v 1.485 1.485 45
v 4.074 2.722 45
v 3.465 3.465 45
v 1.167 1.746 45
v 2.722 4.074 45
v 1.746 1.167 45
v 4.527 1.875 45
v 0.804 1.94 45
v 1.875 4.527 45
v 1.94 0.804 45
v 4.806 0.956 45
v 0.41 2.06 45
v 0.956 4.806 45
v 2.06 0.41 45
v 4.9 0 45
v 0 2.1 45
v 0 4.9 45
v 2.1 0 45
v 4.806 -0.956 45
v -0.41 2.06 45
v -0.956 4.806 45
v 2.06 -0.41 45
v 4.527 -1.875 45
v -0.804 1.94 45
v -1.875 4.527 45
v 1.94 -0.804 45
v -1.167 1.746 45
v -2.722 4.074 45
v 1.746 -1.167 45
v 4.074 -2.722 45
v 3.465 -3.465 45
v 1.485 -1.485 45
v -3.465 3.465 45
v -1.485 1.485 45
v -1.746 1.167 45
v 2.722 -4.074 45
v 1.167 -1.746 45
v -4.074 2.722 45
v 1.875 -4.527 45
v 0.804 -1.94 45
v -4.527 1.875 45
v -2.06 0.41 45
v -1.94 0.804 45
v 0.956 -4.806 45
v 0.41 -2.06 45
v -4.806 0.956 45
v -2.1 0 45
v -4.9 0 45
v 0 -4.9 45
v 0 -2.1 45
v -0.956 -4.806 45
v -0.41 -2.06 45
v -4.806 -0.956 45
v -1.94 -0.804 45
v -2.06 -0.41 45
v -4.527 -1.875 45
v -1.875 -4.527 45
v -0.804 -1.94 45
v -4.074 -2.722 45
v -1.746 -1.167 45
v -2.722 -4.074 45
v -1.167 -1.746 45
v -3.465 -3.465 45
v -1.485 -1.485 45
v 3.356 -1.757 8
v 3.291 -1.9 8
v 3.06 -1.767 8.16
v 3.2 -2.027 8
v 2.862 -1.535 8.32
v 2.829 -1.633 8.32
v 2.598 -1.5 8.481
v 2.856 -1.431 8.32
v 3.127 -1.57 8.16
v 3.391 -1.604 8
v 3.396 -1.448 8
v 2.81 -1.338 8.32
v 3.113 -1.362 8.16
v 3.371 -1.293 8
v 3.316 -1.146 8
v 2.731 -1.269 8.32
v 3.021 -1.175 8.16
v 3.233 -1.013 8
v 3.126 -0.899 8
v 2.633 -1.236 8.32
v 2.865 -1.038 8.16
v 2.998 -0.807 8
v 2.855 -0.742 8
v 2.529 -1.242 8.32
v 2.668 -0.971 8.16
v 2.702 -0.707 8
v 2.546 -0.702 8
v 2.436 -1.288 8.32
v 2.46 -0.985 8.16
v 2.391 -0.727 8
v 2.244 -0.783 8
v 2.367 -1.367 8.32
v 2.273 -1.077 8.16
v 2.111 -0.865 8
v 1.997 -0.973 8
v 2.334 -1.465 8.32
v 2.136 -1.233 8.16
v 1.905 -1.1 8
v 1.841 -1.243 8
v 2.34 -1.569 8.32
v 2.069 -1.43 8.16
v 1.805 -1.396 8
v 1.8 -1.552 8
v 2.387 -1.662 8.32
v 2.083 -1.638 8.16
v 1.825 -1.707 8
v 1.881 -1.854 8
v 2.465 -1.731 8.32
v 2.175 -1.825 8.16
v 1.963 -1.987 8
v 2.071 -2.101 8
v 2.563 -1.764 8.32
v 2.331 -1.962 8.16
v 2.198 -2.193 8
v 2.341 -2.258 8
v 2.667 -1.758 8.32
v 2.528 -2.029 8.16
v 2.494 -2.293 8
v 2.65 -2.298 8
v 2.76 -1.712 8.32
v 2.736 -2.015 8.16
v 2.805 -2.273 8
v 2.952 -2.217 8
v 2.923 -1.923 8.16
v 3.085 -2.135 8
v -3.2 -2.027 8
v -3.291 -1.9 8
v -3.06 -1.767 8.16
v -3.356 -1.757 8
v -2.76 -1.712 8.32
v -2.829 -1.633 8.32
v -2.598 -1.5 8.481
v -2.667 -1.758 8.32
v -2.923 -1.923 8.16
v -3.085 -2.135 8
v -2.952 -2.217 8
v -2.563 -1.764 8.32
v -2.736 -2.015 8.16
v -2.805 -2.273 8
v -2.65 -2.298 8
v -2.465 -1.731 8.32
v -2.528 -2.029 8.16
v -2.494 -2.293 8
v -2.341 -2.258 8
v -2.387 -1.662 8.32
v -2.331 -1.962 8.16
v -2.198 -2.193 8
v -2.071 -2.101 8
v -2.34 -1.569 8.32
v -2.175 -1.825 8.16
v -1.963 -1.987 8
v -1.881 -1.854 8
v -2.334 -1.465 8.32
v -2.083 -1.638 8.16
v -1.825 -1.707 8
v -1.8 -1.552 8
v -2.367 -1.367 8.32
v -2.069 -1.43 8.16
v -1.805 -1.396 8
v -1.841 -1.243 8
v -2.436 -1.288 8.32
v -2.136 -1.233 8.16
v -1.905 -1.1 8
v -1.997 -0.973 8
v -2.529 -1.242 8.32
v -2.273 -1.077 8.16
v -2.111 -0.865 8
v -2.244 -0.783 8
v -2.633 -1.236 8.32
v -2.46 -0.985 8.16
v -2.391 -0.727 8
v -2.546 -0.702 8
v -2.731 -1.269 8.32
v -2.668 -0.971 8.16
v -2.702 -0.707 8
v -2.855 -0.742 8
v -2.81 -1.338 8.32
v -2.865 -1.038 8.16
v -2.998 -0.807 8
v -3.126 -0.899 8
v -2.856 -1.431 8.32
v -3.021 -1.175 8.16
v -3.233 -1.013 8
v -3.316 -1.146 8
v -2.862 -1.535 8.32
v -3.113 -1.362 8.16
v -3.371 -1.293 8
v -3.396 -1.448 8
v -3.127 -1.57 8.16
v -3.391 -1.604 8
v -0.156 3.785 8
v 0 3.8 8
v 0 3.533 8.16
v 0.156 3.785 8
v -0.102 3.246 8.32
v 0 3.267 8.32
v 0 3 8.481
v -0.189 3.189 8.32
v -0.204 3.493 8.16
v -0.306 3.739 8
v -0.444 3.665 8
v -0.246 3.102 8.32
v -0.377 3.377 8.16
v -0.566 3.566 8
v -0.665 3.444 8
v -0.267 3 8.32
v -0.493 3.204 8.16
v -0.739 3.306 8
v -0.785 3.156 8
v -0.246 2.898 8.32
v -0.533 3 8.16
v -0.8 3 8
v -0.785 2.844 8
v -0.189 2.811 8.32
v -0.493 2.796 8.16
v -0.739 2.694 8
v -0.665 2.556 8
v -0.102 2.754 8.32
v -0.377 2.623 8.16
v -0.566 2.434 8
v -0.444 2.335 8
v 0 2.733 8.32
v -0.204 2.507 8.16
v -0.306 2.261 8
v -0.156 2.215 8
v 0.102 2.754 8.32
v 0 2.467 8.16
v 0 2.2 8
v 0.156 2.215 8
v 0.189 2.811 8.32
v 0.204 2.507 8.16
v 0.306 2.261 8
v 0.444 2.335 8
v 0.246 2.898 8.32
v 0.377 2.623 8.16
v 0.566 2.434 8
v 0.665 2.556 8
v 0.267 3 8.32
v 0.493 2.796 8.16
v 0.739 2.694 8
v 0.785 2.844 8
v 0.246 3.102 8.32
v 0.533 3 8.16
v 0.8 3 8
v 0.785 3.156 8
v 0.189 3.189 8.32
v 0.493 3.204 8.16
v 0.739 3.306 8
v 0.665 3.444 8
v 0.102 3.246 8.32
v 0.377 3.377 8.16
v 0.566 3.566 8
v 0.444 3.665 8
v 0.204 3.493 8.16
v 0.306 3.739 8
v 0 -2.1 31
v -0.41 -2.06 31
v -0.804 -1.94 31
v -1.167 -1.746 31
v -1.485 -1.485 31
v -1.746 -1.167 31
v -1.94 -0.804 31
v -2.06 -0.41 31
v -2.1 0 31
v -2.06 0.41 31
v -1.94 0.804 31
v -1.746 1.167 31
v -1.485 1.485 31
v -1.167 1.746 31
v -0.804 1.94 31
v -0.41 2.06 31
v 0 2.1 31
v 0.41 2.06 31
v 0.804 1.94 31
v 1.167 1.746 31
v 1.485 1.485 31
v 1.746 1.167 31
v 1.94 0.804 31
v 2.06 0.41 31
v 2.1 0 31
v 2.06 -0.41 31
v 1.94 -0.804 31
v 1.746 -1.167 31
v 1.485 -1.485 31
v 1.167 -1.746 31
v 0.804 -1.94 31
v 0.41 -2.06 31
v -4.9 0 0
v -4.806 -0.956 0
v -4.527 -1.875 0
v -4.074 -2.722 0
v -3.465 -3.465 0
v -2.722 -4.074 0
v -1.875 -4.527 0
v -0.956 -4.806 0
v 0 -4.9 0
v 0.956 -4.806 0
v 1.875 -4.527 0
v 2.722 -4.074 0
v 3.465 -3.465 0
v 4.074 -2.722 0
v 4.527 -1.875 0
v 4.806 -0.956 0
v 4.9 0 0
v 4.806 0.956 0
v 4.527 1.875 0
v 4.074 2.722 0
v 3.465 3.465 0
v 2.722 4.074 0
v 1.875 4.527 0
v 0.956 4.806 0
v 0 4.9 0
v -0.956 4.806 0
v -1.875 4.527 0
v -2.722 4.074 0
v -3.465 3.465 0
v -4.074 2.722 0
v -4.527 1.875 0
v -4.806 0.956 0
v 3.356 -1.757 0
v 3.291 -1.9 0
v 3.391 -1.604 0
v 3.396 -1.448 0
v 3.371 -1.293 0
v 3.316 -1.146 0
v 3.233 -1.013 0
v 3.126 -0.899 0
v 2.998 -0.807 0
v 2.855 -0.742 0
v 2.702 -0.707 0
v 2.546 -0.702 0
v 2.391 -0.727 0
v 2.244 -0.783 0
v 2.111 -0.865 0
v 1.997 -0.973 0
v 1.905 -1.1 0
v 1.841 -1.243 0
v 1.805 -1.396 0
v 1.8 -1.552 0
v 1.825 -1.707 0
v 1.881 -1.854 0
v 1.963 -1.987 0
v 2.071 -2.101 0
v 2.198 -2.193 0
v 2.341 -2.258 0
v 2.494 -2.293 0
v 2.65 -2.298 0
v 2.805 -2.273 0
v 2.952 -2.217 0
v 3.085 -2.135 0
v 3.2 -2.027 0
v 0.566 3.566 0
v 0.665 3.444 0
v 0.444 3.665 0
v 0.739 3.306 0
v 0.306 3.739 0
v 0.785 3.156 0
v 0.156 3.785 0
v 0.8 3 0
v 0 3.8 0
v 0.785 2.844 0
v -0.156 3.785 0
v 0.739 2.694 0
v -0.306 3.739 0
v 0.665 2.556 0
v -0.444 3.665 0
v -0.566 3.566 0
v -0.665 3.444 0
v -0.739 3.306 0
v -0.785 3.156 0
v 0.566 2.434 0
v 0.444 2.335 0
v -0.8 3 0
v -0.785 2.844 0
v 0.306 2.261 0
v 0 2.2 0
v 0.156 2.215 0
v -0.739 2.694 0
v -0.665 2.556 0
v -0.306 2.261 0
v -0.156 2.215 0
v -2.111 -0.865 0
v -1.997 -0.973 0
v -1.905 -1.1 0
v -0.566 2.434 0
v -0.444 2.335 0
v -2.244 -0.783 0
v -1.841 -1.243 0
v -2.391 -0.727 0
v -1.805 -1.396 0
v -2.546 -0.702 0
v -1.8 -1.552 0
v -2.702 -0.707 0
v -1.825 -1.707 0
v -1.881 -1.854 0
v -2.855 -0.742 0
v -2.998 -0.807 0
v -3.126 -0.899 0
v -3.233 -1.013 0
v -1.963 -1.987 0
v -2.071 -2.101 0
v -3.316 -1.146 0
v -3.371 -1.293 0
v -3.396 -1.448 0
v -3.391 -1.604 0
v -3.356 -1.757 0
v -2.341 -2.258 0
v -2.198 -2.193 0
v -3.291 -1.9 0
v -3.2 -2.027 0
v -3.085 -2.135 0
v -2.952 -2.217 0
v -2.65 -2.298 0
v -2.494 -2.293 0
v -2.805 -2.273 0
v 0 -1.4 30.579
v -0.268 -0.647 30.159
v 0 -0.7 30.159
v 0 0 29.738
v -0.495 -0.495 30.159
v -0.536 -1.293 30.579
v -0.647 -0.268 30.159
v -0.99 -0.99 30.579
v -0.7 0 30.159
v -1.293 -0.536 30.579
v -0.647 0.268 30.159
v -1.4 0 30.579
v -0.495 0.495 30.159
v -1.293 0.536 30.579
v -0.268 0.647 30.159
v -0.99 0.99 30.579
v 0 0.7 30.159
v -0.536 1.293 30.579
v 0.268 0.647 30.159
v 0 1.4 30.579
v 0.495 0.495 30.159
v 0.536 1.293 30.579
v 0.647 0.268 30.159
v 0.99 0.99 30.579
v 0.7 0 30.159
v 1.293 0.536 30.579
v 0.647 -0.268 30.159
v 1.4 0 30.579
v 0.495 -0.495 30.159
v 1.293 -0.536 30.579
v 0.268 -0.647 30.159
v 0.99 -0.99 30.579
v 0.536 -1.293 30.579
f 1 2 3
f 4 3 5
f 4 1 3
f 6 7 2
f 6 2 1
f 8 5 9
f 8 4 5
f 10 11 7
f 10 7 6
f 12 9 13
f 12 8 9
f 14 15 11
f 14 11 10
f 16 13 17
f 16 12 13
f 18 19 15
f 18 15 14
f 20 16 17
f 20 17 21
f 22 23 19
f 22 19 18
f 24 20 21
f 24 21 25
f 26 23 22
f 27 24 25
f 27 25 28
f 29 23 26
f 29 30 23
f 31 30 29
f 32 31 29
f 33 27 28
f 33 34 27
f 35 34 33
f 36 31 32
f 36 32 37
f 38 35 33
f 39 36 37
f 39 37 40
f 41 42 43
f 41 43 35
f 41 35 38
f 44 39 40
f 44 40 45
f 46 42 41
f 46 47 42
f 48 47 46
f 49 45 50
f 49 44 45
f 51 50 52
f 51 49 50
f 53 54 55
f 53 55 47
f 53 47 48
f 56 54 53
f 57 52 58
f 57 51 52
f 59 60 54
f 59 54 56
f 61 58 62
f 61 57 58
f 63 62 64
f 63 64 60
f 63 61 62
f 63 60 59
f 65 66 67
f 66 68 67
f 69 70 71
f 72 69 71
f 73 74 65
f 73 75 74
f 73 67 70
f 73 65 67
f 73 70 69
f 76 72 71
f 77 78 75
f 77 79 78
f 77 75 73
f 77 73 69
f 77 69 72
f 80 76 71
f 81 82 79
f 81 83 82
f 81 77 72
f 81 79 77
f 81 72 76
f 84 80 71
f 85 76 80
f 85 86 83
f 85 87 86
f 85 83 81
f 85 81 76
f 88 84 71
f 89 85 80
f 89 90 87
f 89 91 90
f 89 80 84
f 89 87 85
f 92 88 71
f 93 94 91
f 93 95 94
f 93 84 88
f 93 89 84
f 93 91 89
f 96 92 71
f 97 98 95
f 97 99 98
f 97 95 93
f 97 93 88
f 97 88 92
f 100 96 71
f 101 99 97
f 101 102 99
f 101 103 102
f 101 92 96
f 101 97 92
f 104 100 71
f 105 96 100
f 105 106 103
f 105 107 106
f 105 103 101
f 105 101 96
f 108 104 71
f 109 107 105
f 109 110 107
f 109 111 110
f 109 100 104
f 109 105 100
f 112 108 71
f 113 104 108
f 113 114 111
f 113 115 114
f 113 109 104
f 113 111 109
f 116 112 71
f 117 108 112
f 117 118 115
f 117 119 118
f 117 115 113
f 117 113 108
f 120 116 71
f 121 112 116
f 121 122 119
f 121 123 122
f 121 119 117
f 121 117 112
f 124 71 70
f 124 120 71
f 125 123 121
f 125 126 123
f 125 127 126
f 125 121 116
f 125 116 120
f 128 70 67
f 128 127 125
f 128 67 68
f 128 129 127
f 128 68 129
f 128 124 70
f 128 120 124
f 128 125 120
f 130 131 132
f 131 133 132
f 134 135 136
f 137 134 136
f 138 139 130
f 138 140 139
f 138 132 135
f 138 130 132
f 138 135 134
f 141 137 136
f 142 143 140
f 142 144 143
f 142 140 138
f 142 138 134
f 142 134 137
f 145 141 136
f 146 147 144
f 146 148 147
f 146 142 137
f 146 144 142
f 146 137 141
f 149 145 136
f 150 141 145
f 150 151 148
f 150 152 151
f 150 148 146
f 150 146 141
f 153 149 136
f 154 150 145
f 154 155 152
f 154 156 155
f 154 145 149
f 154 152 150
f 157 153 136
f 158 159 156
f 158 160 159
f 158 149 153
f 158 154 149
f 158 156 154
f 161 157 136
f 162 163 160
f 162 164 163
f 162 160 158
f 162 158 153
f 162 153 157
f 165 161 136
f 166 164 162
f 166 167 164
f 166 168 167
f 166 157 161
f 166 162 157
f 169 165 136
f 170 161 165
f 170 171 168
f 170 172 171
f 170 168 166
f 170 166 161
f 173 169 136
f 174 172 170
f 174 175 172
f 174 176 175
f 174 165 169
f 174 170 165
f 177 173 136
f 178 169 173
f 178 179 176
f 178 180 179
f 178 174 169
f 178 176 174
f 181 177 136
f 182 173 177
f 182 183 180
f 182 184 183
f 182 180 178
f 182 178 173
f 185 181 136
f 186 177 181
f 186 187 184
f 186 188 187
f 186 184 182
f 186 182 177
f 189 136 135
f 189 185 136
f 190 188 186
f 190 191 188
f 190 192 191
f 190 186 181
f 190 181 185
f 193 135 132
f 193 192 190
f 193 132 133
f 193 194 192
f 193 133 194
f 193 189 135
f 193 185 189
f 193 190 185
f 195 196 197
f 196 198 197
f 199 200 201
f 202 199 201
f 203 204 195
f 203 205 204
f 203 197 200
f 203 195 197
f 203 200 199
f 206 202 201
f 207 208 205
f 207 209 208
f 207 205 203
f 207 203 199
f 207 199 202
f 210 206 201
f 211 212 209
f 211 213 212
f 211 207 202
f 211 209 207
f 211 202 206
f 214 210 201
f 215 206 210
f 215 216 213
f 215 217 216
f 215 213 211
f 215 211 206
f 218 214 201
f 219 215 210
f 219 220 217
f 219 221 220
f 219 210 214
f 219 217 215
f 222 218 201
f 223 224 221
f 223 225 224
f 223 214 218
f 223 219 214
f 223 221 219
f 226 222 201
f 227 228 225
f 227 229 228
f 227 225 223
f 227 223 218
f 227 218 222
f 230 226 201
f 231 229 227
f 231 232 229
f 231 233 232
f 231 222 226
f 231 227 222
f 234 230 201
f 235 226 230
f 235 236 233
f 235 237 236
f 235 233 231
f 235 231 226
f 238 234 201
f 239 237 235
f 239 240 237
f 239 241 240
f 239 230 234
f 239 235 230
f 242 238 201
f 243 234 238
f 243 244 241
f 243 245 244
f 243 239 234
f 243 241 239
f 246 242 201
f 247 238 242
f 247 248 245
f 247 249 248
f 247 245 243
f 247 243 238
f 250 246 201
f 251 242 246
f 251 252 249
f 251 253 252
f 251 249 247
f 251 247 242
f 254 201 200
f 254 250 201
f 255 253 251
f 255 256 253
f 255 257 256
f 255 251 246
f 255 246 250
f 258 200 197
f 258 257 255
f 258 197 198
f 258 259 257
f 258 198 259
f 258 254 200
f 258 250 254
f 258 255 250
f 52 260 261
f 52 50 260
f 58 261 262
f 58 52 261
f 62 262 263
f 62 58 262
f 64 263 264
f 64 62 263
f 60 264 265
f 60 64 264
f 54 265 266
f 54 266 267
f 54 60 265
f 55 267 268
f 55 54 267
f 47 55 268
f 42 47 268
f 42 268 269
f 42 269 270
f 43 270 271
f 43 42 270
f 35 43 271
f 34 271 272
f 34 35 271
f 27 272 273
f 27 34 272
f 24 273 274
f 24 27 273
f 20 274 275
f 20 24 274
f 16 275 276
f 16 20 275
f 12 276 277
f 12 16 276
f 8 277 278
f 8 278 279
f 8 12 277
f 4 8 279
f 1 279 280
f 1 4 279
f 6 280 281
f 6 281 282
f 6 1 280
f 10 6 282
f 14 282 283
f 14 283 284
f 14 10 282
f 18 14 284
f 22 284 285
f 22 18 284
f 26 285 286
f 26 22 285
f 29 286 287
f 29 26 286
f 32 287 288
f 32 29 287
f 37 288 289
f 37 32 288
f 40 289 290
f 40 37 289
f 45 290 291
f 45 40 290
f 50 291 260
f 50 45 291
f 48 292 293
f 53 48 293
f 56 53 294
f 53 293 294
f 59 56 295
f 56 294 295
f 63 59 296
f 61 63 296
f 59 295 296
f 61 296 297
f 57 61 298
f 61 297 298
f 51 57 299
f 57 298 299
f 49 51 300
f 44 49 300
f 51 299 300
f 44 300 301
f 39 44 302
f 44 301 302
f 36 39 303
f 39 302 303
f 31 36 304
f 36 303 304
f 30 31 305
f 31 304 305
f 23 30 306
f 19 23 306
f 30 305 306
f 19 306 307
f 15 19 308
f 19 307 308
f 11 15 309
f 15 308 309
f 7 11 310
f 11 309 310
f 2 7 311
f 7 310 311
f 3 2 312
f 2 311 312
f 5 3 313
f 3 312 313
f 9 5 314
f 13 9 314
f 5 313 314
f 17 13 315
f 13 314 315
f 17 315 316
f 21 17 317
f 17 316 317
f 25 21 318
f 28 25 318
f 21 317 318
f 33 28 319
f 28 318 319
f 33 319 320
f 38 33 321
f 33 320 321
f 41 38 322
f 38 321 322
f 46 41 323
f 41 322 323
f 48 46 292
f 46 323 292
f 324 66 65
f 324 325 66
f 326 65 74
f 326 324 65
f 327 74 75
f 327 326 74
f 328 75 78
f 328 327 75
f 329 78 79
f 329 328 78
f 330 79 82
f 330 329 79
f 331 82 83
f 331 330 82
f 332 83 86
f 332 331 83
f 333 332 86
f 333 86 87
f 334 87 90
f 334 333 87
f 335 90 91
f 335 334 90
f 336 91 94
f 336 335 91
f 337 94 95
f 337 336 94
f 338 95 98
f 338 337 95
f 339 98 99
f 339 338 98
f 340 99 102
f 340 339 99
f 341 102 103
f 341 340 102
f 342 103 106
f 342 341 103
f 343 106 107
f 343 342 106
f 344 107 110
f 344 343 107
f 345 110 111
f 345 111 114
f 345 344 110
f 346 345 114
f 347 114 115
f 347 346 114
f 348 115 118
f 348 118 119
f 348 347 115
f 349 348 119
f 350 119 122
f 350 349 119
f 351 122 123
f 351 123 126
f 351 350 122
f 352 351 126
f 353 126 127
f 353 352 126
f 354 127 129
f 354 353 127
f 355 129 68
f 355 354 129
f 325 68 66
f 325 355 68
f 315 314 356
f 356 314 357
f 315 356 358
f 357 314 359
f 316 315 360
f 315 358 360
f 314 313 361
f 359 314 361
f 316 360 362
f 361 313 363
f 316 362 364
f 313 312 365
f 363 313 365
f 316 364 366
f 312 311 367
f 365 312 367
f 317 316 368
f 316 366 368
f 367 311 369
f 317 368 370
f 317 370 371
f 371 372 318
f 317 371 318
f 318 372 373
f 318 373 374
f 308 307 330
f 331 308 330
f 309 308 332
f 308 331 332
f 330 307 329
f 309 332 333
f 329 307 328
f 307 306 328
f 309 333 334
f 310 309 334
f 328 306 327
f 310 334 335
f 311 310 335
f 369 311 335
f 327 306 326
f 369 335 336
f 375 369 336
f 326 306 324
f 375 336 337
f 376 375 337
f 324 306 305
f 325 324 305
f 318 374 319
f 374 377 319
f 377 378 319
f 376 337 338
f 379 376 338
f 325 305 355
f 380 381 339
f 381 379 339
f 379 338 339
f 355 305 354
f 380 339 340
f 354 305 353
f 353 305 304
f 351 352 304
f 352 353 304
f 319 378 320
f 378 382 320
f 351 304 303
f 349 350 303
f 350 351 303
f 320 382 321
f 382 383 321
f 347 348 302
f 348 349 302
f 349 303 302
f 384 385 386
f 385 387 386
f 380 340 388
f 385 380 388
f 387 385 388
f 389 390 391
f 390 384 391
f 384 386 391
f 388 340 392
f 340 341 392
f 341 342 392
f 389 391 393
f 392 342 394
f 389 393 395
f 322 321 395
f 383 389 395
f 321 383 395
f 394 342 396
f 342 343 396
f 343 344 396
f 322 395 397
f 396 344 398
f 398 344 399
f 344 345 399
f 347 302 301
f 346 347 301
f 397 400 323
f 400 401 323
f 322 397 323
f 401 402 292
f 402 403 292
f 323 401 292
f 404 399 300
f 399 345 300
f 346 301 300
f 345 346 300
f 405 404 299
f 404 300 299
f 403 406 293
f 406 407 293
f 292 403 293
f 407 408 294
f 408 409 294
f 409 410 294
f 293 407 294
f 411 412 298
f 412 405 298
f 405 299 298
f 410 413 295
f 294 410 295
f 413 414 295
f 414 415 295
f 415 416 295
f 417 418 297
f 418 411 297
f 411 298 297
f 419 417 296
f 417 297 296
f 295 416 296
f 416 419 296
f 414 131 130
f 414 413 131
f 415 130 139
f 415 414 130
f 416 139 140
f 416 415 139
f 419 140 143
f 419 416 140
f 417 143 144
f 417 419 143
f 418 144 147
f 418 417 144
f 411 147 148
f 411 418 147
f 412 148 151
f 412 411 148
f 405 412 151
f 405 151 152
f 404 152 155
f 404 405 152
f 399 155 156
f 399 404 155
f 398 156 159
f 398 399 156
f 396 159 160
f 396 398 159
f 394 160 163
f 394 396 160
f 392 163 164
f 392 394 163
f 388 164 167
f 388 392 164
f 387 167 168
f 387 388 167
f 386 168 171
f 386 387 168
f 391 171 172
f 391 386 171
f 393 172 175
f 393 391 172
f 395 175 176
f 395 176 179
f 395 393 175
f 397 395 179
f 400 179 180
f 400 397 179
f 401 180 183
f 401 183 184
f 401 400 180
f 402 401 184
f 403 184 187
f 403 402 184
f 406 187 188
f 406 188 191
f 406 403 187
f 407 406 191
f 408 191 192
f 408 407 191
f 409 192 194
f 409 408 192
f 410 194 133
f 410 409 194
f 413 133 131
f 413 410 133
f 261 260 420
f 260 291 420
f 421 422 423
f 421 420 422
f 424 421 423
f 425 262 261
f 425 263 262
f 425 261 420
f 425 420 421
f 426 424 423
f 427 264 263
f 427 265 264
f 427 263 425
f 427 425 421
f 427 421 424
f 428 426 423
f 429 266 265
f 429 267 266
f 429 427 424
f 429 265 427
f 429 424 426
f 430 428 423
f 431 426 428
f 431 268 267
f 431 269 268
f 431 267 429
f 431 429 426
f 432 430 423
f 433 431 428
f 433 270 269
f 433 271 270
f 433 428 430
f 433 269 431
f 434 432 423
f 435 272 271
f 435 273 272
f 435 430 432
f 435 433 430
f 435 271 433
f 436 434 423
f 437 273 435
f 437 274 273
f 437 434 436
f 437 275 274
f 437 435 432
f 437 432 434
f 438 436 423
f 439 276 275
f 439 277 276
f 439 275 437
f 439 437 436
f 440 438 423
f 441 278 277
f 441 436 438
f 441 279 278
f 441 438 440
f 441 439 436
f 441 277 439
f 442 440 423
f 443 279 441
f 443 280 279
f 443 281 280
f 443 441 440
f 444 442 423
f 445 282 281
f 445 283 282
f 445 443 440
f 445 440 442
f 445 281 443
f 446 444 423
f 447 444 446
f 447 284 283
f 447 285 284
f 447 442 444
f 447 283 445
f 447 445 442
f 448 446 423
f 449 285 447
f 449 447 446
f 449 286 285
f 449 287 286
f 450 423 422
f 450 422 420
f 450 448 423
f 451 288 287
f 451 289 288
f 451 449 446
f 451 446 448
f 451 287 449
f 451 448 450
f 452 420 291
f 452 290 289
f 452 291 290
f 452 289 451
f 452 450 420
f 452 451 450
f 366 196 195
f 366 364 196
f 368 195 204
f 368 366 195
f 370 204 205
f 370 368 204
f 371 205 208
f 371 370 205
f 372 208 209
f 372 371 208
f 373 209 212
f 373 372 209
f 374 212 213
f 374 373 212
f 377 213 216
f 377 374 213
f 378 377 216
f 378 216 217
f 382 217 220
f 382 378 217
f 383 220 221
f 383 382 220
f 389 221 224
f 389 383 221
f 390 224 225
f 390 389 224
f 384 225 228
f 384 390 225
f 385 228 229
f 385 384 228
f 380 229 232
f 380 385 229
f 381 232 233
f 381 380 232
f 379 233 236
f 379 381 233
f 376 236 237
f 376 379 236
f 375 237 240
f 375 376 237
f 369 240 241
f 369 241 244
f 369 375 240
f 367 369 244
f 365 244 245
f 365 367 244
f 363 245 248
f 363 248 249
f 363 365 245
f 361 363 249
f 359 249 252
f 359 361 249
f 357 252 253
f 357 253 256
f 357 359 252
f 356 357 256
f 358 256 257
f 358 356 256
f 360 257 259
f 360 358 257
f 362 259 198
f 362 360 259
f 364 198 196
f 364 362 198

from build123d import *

# Parameters (mm, degrees)
ESBO_O1_R                = 4.9
RESSALTO_EXTRUS_O1_DEPTH = 45
PADR_OCIRCULAR1_COUNT    = 3


with BuildPart() as part:
    # Esboço1 → Ressalto-extrusão1 (new body)
    with BuildSketch(Plane.XY):
        with Locations(Location((0, 0, 0), (0, 0, 180))):
            Circle(ESBO_O1_R)
    extrude(amount=RESSALTO_EXTRUS_O1_DEPTH)

    # Esboço2 → Furo roscado de M51 (revolve, cut)
    with BuildSketch(Plane(origin=(0, 0, 45), x_dir=(0, -1, 0), z_dir=(1, 0, 0))):
        Polygon((0, 0), (0, 15.2618073), (2.1, 14), (2.1, 0), align=None)
    revolve(axis=Axis((0, 0, 51.35), (0, 0, -1)), mode=Mode.SUBTRACT)

    # Esboço6 → Furo roscado de M21 (revolve, cut)
    with BuildSketch(Plane(origin=(0, 3, 0), x_dir=(0, 1, 0), z_dir=(1, 0, 0))):
        Polygon((0, 0), (0, 8.480688495), (0.8, 8), (0.8, 0), align=None)
    furo_roscado_de_m21 = revolve(axis=Axis((0, 3, -6.35), (0, 0, 1)), mode=Mode.SUBTRACT)

    # PadrãoCircular1: Furo roscado de M21 ×3 about axis
    padr_ocircular1_axis = Axis((0, 0, 0), (0, 0, 1))
    for i in range(1, PADR_OCIRCULAR1_COUNT):
        add(furo_roscado_de_m21.rotate(padr_ocircular1_axis, i * 360 / PADR_OCIRCULAR1_COUNT), mode=Mode.SUBTRACT)


solid = part.part
